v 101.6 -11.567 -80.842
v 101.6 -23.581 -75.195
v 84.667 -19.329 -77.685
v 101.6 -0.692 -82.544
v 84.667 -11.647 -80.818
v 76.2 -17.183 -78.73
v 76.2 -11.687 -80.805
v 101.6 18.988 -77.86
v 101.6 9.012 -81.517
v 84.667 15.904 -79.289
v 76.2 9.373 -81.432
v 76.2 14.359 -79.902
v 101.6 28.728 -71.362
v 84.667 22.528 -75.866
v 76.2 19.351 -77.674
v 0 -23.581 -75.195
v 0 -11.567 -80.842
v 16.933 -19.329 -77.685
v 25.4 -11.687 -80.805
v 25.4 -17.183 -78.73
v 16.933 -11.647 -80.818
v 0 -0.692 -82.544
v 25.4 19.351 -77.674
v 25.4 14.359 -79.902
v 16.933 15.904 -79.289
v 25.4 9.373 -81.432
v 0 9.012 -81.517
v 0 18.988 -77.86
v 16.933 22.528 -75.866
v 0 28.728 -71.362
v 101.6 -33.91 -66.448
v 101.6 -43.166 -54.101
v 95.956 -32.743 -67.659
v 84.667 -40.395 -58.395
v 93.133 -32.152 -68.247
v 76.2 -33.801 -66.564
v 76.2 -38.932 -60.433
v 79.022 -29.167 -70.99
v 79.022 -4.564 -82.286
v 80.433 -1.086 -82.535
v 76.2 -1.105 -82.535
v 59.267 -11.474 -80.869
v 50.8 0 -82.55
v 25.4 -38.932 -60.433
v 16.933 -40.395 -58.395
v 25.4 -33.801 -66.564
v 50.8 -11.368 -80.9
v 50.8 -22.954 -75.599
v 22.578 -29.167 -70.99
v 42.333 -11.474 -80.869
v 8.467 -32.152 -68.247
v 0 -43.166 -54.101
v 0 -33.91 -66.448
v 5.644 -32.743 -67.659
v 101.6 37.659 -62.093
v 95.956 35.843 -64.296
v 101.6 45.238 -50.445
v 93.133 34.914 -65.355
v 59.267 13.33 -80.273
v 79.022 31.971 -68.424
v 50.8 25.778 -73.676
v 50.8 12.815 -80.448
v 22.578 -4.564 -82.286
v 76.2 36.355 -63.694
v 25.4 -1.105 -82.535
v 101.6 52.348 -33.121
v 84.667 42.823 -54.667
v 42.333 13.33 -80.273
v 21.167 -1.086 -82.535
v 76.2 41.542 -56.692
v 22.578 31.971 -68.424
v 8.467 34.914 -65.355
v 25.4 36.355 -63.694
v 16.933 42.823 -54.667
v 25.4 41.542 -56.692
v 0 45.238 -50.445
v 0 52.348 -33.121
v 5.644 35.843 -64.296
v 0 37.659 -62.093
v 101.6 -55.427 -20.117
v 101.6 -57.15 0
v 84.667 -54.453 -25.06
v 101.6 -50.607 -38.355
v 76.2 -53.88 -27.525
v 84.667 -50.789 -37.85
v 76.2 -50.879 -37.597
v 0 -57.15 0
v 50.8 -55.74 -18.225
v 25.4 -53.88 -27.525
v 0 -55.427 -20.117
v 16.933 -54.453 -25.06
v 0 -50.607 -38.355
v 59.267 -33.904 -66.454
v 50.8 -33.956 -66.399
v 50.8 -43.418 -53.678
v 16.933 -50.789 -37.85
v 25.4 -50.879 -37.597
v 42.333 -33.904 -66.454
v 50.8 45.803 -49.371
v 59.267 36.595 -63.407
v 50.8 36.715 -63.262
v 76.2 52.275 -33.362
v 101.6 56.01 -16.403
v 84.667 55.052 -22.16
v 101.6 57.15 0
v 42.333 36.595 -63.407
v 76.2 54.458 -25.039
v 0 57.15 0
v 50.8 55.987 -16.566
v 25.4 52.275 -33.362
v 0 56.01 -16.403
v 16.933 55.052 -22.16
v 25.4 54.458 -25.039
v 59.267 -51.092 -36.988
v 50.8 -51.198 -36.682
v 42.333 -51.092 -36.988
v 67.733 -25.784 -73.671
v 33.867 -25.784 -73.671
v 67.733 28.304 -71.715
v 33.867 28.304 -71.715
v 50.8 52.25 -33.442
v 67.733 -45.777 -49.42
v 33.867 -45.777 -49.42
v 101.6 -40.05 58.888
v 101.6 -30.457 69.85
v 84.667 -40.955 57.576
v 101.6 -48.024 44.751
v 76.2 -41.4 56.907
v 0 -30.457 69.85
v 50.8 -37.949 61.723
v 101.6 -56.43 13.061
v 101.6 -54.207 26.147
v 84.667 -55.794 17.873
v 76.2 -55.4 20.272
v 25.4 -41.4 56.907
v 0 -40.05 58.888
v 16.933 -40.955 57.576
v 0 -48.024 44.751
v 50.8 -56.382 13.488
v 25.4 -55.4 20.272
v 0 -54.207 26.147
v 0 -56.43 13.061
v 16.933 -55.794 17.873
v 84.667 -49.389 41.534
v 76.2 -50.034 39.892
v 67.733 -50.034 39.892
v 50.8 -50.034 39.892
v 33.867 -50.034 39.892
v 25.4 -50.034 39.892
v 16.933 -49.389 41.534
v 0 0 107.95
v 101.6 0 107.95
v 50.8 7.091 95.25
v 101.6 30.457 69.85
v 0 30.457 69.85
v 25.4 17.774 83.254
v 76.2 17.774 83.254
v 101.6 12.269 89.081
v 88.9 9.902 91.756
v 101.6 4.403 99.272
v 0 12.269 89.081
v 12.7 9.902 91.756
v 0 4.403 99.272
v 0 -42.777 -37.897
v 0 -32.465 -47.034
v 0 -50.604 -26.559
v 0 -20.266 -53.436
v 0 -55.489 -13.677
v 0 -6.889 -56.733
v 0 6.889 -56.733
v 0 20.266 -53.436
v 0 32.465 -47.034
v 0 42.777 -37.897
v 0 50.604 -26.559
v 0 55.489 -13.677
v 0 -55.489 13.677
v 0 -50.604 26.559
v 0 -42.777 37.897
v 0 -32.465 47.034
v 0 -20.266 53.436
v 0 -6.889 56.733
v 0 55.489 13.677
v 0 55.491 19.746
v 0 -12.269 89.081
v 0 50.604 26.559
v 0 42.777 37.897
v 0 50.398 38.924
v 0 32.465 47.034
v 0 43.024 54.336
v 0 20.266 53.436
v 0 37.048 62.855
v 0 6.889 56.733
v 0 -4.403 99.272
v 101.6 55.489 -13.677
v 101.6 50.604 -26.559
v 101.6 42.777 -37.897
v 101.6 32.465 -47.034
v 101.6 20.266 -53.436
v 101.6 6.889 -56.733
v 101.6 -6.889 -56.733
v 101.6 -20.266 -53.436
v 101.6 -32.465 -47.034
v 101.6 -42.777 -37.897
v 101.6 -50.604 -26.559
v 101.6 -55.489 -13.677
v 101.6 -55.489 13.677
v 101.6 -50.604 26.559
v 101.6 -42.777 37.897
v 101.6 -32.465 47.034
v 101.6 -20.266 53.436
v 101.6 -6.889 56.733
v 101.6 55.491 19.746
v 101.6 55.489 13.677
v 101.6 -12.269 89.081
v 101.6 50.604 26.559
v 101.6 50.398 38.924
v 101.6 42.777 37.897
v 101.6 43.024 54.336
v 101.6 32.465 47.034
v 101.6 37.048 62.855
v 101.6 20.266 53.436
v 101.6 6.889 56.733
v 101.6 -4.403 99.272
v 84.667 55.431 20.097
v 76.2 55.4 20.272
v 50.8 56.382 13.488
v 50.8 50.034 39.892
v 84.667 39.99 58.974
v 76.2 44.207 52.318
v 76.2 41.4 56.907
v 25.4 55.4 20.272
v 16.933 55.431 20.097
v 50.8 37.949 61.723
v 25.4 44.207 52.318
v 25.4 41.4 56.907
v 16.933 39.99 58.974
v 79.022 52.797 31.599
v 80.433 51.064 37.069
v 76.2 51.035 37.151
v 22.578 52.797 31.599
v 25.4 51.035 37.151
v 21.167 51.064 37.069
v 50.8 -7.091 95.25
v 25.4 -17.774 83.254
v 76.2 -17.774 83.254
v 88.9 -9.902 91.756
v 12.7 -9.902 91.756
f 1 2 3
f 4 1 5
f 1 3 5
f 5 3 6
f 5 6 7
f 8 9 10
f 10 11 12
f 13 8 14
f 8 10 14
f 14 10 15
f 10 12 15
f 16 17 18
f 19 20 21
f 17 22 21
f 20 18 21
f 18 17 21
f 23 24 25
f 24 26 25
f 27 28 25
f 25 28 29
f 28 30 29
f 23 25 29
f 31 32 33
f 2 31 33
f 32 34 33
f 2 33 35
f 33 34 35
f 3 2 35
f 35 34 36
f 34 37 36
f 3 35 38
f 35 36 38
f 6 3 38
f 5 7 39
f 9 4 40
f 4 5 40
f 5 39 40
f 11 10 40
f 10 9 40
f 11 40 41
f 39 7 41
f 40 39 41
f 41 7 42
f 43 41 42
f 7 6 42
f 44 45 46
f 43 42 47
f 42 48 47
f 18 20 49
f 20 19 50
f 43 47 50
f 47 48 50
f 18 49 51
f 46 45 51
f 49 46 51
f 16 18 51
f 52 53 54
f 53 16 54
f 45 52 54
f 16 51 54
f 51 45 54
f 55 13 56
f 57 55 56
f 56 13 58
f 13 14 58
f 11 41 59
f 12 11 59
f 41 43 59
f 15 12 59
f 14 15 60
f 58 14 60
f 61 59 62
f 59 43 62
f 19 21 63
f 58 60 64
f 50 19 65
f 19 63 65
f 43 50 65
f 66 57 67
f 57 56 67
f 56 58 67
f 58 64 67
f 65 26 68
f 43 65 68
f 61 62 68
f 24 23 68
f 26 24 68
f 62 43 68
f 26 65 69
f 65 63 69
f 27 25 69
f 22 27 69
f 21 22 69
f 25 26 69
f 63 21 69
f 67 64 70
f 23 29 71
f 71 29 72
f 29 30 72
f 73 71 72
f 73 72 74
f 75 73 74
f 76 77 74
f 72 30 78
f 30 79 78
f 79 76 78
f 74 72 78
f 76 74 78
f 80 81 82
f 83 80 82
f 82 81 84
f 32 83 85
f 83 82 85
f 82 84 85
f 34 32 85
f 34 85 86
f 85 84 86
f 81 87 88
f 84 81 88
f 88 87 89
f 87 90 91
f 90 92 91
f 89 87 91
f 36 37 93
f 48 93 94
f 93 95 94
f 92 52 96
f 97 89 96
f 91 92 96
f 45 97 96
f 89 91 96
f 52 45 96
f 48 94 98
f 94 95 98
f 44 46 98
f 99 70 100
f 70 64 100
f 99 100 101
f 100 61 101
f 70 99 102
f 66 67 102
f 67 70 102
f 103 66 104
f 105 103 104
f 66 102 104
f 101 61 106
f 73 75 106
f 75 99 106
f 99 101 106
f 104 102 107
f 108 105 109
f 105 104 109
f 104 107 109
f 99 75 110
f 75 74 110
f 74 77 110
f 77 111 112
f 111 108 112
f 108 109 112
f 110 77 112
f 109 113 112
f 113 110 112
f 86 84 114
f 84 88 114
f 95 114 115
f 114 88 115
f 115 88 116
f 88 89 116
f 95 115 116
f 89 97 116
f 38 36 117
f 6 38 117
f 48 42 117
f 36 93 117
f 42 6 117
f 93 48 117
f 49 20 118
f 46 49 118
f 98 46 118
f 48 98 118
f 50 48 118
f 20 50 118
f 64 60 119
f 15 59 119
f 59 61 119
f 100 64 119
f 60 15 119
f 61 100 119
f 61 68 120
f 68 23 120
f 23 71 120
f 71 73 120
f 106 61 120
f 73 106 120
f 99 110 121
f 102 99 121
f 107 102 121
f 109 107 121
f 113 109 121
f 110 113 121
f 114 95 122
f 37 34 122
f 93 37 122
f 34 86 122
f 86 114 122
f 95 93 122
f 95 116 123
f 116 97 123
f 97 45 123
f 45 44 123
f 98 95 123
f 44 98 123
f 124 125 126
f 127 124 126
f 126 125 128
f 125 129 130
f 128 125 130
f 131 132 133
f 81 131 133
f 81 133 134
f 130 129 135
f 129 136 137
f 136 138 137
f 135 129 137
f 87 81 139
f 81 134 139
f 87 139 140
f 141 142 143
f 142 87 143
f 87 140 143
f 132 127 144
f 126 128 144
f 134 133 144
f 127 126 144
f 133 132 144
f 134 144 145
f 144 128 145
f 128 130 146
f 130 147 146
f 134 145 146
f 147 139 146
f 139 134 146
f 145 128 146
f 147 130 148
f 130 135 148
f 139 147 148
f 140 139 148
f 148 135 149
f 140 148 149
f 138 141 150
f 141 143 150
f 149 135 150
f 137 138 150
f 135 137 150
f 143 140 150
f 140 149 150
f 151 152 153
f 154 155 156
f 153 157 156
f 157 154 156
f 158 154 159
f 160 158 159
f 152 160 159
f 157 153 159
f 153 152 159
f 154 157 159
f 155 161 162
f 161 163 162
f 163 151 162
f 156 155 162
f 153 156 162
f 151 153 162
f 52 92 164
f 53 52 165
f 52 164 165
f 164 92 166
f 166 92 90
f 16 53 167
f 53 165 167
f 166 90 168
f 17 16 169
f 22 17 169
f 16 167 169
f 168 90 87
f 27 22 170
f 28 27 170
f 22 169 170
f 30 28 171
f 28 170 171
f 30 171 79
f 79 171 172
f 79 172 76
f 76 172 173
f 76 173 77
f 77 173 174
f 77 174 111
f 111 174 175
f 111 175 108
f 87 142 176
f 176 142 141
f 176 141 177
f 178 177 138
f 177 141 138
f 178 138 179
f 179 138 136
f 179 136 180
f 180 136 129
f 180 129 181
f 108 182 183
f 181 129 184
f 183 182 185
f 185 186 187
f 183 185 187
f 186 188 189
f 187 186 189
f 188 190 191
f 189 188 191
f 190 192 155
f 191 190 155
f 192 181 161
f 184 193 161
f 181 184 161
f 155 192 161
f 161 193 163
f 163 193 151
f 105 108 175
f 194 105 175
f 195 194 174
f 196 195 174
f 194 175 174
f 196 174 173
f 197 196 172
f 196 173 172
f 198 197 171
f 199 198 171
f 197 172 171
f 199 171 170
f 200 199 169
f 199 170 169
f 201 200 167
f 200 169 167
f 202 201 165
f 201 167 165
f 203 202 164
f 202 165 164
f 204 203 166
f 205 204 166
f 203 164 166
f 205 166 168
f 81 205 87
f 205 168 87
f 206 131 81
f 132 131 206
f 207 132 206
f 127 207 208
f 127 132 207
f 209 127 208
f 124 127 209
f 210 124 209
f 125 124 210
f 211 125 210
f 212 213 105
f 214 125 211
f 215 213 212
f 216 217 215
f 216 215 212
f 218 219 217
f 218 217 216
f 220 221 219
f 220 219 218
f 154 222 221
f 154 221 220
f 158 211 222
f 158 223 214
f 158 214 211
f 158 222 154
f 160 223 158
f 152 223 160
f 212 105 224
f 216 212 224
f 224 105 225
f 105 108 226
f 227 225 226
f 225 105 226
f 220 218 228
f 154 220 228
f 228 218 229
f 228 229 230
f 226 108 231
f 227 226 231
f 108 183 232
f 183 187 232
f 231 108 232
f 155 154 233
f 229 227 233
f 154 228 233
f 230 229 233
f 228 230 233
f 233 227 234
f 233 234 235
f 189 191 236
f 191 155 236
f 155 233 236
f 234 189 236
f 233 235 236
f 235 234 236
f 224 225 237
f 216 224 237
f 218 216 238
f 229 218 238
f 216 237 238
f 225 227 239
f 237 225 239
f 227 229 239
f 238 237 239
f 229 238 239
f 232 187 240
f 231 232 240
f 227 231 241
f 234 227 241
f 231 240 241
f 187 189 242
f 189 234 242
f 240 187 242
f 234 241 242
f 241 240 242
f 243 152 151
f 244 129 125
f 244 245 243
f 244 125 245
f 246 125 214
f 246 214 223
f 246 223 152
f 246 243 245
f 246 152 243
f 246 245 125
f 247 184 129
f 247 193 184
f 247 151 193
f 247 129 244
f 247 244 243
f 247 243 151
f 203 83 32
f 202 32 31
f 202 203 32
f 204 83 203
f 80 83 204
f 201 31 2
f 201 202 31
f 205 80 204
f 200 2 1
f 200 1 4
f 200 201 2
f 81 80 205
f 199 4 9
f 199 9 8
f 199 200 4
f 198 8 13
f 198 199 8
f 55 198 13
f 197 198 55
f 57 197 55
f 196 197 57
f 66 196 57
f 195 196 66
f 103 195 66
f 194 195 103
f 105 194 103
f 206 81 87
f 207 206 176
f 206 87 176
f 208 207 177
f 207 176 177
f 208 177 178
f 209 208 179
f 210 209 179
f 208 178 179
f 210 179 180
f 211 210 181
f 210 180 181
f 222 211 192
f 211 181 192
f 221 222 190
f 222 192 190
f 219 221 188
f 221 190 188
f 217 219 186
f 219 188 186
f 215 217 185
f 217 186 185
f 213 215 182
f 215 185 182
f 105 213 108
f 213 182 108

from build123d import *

# Parameters (mm, degrees)
F1_DEPTH = 101.6


with BuildPart() as f1:
    # F0 (on Right) → F1 (new body)
    with BuildSketch(Plane.YZ):
        with BuildLine():
            ThreePointArc((-57.15, 4.662e-07), (2.331e-07, 57.15), (57.15, 0))
            add(Edge.make_bspline(
                [(57.15, 0), (57.15, 45.5660748492), (30.4574472777, 69.85)],
                knots=[4.7123889804, 4.7123889804, 4.7123889804, 5.7211155042, 5.7211155042, 5.7211155042], degree=2, weights=[1, 0.8754823556, 1]))
            add(Edge.make_bspline(
                [(30.4574472777, 69.85), (22.353595846, 79.0299545271), (6.1492050592, 93.7377079612), (1.8810714701, 104.0494172792), (0, 107.95)],
                knots=[0, 0, 0, 0, 0.6063584653, 1, 1, 1, 1], degree=3))
            add(Edge.make_bspline(
                [(-30.4574472777, 69.85), (-22.353595846, 79.0299545271), (-6.1492050592, 93.7377079612), (-1.8810714701, 104.0494172792), (0, 107.95)],
                knots=[0, 0, 0, 0, 0.6063584653, 1, 1, 1, 1], degree=3))
            add(Edge.make_bspline(
                [(-30.4574472777, 69.85), (-57.1499998218, 45.5660750112), (-57.15, 4.662e-07)],
                knots=[0.562069803, 0.562069803, 0.562069803, 1.5707963211, 1.5707963211, 1.5707963211], degree=2, weights=[1, 0.875482357, 1]))
        make_face()
    extrude(amount=F1_DEPTH)


with BuildPart() as f1b:
    # F0 (on Right) → F1, piece 2 (new body)
    with BuildSketch(Plane.YZ):
        with BuildLine():
            add(Edge.make_bspline(
                [(-57.15, 4.662e-07), (-57.1500003228, -82.5499997669), (-1.614e-07, -82.55), (57.15, -82.5500002331), (57.15, 0)],
                knots=[1.5707963211, 1.5707963211, 1.5707963211, 3.1415926508, 3.1415926508, 4.7123889804, 4.7123889804, 4.7123889804], degree=2, weights=[1, 0.7071067802, 1, 0.7071067802, 1]))
            ThreePointArc((57.15, 0), (-2.331e-07, -57.15), (-57.15, 4.662e-07))
        make_face()
    extrude(amount=F1_DEPTH)


solid = Compound([f1.part, f1b.part])
